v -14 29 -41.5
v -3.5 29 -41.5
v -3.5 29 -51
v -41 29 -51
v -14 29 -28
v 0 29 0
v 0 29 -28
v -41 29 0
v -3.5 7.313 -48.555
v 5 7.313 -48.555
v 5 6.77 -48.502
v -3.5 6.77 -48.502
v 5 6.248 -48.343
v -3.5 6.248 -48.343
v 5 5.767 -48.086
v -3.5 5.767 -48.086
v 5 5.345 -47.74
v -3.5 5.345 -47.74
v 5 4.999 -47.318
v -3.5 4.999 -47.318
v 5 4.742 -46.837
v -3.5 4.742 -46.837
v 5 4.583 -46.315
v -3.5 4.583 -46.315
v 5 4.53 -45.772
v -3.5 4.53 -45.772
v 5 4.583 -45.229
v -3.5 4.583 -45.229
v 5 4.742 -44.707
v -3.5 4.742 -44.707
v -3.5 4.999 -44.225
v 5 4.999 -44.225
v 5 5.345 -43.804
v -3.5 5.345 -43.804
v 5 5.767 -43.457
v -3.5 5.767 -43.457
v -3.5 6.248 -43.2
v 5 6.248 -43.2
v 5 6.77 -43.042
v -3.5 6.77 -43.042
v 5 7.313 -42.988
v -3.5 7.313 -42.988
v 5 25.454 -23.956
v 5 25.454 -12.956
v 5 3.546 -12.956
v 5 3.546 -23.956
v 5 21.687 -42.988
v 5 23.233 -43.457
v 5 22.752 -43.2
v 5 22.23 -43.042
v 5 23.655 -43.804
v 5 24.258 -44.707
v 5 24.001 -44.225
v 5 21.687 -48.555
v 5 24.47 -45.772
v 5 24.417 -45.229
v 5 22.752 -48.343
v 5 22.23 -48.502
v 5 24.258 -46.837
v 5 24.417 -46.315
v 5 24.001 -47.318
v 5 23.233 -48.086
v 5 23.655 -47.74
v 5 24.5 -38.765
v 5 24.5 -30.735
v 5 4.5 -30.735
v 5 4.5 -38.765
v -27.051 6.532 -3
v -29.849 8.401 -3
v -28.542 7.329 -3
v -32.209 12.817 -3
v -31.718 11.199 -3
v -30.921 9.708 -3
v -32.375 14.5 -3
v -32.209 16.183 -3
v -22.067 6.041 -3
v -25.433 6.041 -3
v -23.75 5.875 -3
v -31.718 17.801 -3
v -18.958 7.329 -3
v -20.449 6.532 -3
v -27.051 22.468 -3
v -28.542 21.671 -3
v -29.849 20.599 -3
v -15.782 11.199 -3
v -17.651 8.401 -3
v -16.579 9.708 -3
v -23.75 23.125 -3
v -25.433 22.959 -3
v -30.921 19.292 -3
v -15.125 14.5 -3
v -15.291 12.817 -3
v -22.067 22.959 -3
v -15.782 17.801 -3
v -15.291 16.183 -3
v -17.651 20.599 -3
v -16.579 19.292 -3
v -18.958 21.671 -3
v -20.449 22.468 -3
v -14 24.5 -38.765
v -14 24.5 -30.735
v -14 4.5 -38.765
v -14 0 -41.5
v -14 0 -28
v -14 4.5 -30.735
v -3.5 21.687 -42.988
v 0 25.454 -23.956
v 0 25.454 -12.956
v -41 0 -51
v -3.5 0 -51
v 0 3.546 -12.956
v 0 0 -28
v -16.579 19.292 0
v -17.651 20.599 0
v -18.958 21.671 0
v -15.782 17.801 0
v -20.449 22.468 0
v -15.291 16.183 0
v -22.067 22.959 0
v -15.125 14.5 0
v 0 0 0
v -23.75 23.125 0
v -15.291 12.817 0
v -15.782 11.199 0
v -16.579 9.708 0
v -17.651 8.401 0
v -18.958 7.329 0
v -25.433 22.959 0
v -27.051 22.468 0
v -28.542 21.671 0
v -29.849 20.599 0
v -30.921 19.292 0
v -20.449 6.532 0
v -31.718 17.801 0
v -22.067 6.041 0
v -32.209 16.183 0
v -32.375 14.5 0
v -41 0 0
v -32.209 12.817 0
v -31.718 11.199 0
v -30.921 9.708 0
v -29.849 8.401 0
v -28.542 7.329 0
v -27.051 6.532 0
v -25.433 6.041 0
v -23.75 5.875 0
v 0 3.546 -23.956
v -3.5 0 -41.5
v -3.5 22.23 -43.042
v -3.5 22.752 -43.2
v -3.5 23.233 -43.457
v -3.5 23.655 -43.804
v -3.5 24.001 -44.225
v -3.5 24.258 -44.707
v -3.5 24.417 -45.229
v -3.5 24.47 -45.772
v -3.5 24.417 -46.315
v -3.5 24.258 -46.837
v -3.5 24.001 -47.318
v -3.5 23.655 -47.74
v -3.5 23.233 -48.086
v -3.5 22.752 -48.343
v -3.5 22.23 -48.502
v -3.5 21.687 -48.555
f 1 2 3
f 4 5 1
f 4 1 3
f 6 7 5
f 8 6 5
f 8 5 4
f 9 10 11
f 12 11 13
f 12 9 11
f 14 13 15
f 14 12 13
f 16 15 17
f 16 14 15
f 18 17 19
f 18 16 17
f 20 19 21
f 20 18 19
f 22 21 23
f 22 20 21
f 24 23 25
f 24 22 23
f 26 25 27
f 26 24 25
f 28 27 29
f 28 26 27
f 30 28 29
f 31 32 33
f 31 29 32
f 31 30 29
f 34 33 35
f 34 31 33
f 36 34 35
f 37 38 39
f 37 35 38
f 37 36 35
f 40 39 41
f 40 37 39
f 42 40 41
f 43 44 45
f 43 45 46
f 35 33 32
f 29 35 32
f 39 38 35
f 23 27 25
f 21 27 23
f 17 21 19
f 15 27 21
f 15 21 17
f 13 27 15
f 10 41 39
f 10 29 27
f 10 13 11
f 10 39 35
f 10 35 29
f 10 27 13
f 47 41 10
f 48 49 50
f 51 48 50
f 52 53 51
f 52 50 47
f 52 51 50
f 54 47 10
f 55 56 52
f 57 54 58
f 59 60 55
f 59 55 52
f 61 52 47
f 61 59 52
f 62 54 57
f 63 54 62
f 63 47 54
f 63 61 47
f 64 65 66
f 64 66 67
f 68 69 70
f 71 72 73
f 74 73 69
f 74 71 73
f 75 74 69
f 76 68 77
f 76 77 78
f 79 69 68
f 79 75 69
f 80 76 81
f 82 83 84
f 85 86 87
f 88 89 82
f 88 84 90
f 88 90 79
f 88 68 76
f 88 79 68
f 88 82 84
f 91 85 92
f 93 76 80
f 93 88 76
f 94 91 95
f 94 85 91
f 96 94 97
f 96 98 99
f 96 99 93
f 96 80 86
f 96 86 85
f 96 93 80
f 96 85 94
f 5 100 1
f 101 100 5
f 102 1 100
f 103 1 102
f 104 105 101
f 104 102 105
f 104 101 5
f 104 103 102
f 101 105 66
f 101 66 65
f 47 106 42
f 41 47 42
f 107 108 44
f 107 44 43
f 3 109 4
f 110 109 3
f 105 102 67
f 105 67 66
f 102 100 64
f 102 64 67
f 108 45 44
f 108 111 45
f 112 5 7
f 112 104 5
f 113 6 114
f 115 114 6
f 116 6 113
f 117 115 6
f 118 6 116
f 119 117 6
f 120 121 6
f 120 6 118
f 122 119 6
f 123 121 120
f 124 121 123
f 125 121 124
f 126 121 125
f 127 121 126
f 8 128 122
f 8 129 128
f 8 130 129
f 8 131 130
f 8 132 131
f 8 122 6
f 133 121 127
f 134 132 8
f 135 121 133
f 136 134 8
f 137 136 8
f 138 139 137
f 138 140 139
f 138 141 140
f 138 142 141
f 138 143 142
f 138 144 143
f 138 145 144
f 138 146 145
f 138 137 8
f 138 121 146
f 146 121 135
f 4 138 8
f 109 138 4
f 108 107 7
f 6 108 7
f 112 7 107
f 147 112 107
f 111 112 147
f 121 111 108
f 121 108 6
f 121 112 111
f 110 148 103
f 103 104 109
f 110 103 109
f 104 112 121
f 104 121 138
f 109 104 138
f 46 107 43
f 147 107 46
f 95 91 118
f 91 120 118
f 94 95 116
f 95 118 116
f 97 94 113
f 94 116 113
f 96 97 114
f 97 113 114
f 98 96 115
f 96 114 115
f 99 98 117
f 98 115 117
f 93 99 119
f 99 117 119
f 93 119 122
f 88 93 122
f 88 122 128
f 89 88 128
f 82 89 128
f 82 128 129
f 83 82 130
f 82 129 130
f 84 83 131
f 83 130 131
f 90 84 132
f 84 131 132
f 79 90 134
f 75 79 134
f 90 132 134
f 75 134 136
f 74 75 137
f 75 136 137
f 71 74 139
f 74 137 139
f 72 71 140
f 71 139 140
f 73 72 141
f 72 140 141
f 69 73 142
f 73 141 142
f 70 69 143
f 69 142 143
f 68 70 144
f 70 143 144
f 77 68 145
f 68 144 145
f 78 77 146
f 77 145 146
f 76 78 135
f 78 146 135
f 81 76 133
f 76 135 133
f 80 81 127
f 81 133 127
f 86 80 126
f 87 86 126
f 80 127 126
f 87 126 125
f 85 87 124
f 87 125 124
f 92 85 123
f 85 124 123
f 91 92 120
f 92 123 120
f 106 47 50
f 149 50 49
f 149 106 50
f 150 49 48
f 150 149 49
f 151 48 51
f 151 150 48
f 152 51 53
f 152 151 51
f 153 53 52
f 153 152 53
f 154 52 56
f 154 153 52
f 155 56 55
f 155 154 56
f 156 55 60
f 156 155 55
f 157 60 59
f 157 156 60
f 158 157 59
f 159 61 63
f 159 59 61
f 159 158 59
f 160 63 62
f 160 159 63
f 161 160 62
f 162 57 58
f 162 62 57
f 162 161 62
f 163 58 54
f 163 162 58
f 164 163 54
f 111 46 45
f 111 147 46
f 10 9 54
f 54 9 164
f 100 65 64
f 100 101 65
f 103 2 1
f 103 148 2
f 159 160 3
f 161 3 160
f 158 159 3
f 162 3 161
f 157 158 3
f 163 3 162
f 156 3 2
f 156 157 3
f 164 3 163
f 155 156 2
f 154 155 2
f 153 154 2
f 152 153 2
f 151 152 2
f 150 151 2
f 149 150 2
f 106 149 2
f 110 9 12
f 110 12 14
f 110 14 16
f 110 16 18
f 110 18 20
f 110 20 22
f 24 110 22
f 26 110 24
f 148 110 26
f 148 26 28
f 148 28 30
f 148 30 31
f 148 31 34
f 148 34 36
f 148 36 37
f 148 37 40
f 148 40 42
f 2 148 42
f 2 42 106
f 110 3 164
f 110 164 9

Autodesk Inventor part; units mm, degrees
ref_plane "YZ Plane" through (0, 0, 0) normal (1, 0, 0) x (0, 1, 0)
ref_plane "XZ Plane" through (0, 0, 0) normal (0, 1, 0) x (-1, 0, 0)
ref_plane "XY Plane" through (0, 0, 0) normal (0, 0, 1) x (1, 0, 0)
sketch "Sketch1" plane through (0, 0, 0) normal (0, 1, 0) x (-1, 0, 0)
  line L0 (0, 0) -> (41, 0)
  line L1 (0, 0) -> (41, 0) construction
  line L2 (41, 0) -> (41, -51)
  line L3 (41, -51) -> (3.5, -51)
  line L4 (3.5, -51) -> (3.5, -41.5)
  line L5 (3.5, -41.5) -> (14, -41.5)
  line L6 (14, -41.5) -> (14, -28)
  line L7 (14, -28) -> (0, -28)
  line L8 (0, -28) -> (0, 0)
  dimension "d0" = 41
  dimension "d1" = 0
  dimension "d2" = 51
  dimension "d3" = 90
  dimension "d4" = 37.5
  dimension "d5" = 90
  dimension "d6" = 9.5
  dimension "d7" = 90
  dimension "d8" = 10.5
  dimension "d9" = 13.5
  dimension "d10" = 90
extrude "Extrusion1" add sketch "Sketch1" along normal blind 29
sketch "Sketch2" plane through (-41, 0, 0) normal (0, 0, 1) x (1, 0, 0)
  line L0 (41, 0) -> (0, 0) projected
  line L1 (41, 0) -> (41, 29) projected
  line L2 (0, 29) -> (41, 29) projected
  line L3 (0, 0) -> (0, 29) projected
  circle A0 centre (17.25, 14.5) radius 8.625
  dimension "d13" = 17.25
  dimension "d14" = 17.25
  dimension "d15" = 14.5
extrude "Extrusion2" cut sketch "Sketch2" against normal blind 3 contours A0
sketch "Sketch3" plane through (-14, 0, -28) normal (1, 0, 0) x (0, 0, -1)
  line L0 (13.5, 0) -> (0, 0) projected
  line L1 (13.5, 0) -> (13.5, 29) projected
  line L2 (0, 29) -> (13.5, 29) projected
  line L3 (0, 0) -> (0, 29) projected
  line L4 (0, 0) -> (-28, 0) projected
  line L5 (0, 0) -> (0, 29) projected
  line L6 (-28, 29) -> (0, 29) projected
  line L7 (-28, 0) -> (-28, 29) projected
  line L8 (23, 0) -> (13.5, 0) projected
  line L9 (23, 0) -> (23, 29) projected
  line L10 (13.5, 29) -> (23, 29) projected
  line L11 (13.5, 0) -> (13.5, 29) projected
  line L12 (2.7351, 24.5) -> (10.7649, 24.5)
  line L13 (10.7649, 24.5) -> (10.7649, 4.5)
  line L14 (10.7649, 4.5) -> (2.7351, 4.5)
  line L15 (2.7351, 4.5) -> (2.7351, 24.5)
  line L16 (2.7351, 24.5) -> (10.7649, 4.5) construction
  line L17 (10.7649, 24.5) -> (2.7351, 4.5) construction
  line L18 (-15.0444, 25.4539) -> (-4.0444, 25.4539)
  line L19 (-4.0444, 25.4539) -> (-4.0444, 3.5461)
  line L20 (-4.0444, 3.5461) -> (-15.0444, 3.5461)
  line L21 (-15.0444, 3.5461) -> (-15.0444, 25.4539)
  line L22 (-15.0444, 25.4539) -> (-4.0444, 3.5461) construction
  line L23 (-4.0444, 25.4539) -> (-15.0444, 3.5461) construction
  line L24 (17.7718, 7.3132) -> (17.7718, 21.6868) construction
  line L25 (20.5552, 7.3132) -> (20.5552, 21.6868)
  line L26 (14.9884, 21.6868) -> (14.9884, 7.3132)
  arc A0 (14.9884, 7.3132) -> (20.5552, 7.3132) centre (17.7718, 7.3132) ccw
  arc A1 (20.5552, 21.6868) -> (14.9884, 21.6868) centre (17.7718, 21.6868) ccw
  point P0 (6.75, 14.5)
  point P1 (-9.5444, 14.5)
  point P2 (17.7718, 14.5)
  dimension "d18" = 20
  dimension "d19" = 11
extrude "Extrusion3" add sketch "Sketch3" along normal blind 19 contours L12 L13 L14 L15 | L18 L19 L20 L21 | A0 L26 A1 L25
ref_plane "Work Plane1" through (-23.75, 14.5, -3) normal (0, 1, 0) x (1, 0, 0)
properties part number "00_RGB_Laser_Laserlands"
